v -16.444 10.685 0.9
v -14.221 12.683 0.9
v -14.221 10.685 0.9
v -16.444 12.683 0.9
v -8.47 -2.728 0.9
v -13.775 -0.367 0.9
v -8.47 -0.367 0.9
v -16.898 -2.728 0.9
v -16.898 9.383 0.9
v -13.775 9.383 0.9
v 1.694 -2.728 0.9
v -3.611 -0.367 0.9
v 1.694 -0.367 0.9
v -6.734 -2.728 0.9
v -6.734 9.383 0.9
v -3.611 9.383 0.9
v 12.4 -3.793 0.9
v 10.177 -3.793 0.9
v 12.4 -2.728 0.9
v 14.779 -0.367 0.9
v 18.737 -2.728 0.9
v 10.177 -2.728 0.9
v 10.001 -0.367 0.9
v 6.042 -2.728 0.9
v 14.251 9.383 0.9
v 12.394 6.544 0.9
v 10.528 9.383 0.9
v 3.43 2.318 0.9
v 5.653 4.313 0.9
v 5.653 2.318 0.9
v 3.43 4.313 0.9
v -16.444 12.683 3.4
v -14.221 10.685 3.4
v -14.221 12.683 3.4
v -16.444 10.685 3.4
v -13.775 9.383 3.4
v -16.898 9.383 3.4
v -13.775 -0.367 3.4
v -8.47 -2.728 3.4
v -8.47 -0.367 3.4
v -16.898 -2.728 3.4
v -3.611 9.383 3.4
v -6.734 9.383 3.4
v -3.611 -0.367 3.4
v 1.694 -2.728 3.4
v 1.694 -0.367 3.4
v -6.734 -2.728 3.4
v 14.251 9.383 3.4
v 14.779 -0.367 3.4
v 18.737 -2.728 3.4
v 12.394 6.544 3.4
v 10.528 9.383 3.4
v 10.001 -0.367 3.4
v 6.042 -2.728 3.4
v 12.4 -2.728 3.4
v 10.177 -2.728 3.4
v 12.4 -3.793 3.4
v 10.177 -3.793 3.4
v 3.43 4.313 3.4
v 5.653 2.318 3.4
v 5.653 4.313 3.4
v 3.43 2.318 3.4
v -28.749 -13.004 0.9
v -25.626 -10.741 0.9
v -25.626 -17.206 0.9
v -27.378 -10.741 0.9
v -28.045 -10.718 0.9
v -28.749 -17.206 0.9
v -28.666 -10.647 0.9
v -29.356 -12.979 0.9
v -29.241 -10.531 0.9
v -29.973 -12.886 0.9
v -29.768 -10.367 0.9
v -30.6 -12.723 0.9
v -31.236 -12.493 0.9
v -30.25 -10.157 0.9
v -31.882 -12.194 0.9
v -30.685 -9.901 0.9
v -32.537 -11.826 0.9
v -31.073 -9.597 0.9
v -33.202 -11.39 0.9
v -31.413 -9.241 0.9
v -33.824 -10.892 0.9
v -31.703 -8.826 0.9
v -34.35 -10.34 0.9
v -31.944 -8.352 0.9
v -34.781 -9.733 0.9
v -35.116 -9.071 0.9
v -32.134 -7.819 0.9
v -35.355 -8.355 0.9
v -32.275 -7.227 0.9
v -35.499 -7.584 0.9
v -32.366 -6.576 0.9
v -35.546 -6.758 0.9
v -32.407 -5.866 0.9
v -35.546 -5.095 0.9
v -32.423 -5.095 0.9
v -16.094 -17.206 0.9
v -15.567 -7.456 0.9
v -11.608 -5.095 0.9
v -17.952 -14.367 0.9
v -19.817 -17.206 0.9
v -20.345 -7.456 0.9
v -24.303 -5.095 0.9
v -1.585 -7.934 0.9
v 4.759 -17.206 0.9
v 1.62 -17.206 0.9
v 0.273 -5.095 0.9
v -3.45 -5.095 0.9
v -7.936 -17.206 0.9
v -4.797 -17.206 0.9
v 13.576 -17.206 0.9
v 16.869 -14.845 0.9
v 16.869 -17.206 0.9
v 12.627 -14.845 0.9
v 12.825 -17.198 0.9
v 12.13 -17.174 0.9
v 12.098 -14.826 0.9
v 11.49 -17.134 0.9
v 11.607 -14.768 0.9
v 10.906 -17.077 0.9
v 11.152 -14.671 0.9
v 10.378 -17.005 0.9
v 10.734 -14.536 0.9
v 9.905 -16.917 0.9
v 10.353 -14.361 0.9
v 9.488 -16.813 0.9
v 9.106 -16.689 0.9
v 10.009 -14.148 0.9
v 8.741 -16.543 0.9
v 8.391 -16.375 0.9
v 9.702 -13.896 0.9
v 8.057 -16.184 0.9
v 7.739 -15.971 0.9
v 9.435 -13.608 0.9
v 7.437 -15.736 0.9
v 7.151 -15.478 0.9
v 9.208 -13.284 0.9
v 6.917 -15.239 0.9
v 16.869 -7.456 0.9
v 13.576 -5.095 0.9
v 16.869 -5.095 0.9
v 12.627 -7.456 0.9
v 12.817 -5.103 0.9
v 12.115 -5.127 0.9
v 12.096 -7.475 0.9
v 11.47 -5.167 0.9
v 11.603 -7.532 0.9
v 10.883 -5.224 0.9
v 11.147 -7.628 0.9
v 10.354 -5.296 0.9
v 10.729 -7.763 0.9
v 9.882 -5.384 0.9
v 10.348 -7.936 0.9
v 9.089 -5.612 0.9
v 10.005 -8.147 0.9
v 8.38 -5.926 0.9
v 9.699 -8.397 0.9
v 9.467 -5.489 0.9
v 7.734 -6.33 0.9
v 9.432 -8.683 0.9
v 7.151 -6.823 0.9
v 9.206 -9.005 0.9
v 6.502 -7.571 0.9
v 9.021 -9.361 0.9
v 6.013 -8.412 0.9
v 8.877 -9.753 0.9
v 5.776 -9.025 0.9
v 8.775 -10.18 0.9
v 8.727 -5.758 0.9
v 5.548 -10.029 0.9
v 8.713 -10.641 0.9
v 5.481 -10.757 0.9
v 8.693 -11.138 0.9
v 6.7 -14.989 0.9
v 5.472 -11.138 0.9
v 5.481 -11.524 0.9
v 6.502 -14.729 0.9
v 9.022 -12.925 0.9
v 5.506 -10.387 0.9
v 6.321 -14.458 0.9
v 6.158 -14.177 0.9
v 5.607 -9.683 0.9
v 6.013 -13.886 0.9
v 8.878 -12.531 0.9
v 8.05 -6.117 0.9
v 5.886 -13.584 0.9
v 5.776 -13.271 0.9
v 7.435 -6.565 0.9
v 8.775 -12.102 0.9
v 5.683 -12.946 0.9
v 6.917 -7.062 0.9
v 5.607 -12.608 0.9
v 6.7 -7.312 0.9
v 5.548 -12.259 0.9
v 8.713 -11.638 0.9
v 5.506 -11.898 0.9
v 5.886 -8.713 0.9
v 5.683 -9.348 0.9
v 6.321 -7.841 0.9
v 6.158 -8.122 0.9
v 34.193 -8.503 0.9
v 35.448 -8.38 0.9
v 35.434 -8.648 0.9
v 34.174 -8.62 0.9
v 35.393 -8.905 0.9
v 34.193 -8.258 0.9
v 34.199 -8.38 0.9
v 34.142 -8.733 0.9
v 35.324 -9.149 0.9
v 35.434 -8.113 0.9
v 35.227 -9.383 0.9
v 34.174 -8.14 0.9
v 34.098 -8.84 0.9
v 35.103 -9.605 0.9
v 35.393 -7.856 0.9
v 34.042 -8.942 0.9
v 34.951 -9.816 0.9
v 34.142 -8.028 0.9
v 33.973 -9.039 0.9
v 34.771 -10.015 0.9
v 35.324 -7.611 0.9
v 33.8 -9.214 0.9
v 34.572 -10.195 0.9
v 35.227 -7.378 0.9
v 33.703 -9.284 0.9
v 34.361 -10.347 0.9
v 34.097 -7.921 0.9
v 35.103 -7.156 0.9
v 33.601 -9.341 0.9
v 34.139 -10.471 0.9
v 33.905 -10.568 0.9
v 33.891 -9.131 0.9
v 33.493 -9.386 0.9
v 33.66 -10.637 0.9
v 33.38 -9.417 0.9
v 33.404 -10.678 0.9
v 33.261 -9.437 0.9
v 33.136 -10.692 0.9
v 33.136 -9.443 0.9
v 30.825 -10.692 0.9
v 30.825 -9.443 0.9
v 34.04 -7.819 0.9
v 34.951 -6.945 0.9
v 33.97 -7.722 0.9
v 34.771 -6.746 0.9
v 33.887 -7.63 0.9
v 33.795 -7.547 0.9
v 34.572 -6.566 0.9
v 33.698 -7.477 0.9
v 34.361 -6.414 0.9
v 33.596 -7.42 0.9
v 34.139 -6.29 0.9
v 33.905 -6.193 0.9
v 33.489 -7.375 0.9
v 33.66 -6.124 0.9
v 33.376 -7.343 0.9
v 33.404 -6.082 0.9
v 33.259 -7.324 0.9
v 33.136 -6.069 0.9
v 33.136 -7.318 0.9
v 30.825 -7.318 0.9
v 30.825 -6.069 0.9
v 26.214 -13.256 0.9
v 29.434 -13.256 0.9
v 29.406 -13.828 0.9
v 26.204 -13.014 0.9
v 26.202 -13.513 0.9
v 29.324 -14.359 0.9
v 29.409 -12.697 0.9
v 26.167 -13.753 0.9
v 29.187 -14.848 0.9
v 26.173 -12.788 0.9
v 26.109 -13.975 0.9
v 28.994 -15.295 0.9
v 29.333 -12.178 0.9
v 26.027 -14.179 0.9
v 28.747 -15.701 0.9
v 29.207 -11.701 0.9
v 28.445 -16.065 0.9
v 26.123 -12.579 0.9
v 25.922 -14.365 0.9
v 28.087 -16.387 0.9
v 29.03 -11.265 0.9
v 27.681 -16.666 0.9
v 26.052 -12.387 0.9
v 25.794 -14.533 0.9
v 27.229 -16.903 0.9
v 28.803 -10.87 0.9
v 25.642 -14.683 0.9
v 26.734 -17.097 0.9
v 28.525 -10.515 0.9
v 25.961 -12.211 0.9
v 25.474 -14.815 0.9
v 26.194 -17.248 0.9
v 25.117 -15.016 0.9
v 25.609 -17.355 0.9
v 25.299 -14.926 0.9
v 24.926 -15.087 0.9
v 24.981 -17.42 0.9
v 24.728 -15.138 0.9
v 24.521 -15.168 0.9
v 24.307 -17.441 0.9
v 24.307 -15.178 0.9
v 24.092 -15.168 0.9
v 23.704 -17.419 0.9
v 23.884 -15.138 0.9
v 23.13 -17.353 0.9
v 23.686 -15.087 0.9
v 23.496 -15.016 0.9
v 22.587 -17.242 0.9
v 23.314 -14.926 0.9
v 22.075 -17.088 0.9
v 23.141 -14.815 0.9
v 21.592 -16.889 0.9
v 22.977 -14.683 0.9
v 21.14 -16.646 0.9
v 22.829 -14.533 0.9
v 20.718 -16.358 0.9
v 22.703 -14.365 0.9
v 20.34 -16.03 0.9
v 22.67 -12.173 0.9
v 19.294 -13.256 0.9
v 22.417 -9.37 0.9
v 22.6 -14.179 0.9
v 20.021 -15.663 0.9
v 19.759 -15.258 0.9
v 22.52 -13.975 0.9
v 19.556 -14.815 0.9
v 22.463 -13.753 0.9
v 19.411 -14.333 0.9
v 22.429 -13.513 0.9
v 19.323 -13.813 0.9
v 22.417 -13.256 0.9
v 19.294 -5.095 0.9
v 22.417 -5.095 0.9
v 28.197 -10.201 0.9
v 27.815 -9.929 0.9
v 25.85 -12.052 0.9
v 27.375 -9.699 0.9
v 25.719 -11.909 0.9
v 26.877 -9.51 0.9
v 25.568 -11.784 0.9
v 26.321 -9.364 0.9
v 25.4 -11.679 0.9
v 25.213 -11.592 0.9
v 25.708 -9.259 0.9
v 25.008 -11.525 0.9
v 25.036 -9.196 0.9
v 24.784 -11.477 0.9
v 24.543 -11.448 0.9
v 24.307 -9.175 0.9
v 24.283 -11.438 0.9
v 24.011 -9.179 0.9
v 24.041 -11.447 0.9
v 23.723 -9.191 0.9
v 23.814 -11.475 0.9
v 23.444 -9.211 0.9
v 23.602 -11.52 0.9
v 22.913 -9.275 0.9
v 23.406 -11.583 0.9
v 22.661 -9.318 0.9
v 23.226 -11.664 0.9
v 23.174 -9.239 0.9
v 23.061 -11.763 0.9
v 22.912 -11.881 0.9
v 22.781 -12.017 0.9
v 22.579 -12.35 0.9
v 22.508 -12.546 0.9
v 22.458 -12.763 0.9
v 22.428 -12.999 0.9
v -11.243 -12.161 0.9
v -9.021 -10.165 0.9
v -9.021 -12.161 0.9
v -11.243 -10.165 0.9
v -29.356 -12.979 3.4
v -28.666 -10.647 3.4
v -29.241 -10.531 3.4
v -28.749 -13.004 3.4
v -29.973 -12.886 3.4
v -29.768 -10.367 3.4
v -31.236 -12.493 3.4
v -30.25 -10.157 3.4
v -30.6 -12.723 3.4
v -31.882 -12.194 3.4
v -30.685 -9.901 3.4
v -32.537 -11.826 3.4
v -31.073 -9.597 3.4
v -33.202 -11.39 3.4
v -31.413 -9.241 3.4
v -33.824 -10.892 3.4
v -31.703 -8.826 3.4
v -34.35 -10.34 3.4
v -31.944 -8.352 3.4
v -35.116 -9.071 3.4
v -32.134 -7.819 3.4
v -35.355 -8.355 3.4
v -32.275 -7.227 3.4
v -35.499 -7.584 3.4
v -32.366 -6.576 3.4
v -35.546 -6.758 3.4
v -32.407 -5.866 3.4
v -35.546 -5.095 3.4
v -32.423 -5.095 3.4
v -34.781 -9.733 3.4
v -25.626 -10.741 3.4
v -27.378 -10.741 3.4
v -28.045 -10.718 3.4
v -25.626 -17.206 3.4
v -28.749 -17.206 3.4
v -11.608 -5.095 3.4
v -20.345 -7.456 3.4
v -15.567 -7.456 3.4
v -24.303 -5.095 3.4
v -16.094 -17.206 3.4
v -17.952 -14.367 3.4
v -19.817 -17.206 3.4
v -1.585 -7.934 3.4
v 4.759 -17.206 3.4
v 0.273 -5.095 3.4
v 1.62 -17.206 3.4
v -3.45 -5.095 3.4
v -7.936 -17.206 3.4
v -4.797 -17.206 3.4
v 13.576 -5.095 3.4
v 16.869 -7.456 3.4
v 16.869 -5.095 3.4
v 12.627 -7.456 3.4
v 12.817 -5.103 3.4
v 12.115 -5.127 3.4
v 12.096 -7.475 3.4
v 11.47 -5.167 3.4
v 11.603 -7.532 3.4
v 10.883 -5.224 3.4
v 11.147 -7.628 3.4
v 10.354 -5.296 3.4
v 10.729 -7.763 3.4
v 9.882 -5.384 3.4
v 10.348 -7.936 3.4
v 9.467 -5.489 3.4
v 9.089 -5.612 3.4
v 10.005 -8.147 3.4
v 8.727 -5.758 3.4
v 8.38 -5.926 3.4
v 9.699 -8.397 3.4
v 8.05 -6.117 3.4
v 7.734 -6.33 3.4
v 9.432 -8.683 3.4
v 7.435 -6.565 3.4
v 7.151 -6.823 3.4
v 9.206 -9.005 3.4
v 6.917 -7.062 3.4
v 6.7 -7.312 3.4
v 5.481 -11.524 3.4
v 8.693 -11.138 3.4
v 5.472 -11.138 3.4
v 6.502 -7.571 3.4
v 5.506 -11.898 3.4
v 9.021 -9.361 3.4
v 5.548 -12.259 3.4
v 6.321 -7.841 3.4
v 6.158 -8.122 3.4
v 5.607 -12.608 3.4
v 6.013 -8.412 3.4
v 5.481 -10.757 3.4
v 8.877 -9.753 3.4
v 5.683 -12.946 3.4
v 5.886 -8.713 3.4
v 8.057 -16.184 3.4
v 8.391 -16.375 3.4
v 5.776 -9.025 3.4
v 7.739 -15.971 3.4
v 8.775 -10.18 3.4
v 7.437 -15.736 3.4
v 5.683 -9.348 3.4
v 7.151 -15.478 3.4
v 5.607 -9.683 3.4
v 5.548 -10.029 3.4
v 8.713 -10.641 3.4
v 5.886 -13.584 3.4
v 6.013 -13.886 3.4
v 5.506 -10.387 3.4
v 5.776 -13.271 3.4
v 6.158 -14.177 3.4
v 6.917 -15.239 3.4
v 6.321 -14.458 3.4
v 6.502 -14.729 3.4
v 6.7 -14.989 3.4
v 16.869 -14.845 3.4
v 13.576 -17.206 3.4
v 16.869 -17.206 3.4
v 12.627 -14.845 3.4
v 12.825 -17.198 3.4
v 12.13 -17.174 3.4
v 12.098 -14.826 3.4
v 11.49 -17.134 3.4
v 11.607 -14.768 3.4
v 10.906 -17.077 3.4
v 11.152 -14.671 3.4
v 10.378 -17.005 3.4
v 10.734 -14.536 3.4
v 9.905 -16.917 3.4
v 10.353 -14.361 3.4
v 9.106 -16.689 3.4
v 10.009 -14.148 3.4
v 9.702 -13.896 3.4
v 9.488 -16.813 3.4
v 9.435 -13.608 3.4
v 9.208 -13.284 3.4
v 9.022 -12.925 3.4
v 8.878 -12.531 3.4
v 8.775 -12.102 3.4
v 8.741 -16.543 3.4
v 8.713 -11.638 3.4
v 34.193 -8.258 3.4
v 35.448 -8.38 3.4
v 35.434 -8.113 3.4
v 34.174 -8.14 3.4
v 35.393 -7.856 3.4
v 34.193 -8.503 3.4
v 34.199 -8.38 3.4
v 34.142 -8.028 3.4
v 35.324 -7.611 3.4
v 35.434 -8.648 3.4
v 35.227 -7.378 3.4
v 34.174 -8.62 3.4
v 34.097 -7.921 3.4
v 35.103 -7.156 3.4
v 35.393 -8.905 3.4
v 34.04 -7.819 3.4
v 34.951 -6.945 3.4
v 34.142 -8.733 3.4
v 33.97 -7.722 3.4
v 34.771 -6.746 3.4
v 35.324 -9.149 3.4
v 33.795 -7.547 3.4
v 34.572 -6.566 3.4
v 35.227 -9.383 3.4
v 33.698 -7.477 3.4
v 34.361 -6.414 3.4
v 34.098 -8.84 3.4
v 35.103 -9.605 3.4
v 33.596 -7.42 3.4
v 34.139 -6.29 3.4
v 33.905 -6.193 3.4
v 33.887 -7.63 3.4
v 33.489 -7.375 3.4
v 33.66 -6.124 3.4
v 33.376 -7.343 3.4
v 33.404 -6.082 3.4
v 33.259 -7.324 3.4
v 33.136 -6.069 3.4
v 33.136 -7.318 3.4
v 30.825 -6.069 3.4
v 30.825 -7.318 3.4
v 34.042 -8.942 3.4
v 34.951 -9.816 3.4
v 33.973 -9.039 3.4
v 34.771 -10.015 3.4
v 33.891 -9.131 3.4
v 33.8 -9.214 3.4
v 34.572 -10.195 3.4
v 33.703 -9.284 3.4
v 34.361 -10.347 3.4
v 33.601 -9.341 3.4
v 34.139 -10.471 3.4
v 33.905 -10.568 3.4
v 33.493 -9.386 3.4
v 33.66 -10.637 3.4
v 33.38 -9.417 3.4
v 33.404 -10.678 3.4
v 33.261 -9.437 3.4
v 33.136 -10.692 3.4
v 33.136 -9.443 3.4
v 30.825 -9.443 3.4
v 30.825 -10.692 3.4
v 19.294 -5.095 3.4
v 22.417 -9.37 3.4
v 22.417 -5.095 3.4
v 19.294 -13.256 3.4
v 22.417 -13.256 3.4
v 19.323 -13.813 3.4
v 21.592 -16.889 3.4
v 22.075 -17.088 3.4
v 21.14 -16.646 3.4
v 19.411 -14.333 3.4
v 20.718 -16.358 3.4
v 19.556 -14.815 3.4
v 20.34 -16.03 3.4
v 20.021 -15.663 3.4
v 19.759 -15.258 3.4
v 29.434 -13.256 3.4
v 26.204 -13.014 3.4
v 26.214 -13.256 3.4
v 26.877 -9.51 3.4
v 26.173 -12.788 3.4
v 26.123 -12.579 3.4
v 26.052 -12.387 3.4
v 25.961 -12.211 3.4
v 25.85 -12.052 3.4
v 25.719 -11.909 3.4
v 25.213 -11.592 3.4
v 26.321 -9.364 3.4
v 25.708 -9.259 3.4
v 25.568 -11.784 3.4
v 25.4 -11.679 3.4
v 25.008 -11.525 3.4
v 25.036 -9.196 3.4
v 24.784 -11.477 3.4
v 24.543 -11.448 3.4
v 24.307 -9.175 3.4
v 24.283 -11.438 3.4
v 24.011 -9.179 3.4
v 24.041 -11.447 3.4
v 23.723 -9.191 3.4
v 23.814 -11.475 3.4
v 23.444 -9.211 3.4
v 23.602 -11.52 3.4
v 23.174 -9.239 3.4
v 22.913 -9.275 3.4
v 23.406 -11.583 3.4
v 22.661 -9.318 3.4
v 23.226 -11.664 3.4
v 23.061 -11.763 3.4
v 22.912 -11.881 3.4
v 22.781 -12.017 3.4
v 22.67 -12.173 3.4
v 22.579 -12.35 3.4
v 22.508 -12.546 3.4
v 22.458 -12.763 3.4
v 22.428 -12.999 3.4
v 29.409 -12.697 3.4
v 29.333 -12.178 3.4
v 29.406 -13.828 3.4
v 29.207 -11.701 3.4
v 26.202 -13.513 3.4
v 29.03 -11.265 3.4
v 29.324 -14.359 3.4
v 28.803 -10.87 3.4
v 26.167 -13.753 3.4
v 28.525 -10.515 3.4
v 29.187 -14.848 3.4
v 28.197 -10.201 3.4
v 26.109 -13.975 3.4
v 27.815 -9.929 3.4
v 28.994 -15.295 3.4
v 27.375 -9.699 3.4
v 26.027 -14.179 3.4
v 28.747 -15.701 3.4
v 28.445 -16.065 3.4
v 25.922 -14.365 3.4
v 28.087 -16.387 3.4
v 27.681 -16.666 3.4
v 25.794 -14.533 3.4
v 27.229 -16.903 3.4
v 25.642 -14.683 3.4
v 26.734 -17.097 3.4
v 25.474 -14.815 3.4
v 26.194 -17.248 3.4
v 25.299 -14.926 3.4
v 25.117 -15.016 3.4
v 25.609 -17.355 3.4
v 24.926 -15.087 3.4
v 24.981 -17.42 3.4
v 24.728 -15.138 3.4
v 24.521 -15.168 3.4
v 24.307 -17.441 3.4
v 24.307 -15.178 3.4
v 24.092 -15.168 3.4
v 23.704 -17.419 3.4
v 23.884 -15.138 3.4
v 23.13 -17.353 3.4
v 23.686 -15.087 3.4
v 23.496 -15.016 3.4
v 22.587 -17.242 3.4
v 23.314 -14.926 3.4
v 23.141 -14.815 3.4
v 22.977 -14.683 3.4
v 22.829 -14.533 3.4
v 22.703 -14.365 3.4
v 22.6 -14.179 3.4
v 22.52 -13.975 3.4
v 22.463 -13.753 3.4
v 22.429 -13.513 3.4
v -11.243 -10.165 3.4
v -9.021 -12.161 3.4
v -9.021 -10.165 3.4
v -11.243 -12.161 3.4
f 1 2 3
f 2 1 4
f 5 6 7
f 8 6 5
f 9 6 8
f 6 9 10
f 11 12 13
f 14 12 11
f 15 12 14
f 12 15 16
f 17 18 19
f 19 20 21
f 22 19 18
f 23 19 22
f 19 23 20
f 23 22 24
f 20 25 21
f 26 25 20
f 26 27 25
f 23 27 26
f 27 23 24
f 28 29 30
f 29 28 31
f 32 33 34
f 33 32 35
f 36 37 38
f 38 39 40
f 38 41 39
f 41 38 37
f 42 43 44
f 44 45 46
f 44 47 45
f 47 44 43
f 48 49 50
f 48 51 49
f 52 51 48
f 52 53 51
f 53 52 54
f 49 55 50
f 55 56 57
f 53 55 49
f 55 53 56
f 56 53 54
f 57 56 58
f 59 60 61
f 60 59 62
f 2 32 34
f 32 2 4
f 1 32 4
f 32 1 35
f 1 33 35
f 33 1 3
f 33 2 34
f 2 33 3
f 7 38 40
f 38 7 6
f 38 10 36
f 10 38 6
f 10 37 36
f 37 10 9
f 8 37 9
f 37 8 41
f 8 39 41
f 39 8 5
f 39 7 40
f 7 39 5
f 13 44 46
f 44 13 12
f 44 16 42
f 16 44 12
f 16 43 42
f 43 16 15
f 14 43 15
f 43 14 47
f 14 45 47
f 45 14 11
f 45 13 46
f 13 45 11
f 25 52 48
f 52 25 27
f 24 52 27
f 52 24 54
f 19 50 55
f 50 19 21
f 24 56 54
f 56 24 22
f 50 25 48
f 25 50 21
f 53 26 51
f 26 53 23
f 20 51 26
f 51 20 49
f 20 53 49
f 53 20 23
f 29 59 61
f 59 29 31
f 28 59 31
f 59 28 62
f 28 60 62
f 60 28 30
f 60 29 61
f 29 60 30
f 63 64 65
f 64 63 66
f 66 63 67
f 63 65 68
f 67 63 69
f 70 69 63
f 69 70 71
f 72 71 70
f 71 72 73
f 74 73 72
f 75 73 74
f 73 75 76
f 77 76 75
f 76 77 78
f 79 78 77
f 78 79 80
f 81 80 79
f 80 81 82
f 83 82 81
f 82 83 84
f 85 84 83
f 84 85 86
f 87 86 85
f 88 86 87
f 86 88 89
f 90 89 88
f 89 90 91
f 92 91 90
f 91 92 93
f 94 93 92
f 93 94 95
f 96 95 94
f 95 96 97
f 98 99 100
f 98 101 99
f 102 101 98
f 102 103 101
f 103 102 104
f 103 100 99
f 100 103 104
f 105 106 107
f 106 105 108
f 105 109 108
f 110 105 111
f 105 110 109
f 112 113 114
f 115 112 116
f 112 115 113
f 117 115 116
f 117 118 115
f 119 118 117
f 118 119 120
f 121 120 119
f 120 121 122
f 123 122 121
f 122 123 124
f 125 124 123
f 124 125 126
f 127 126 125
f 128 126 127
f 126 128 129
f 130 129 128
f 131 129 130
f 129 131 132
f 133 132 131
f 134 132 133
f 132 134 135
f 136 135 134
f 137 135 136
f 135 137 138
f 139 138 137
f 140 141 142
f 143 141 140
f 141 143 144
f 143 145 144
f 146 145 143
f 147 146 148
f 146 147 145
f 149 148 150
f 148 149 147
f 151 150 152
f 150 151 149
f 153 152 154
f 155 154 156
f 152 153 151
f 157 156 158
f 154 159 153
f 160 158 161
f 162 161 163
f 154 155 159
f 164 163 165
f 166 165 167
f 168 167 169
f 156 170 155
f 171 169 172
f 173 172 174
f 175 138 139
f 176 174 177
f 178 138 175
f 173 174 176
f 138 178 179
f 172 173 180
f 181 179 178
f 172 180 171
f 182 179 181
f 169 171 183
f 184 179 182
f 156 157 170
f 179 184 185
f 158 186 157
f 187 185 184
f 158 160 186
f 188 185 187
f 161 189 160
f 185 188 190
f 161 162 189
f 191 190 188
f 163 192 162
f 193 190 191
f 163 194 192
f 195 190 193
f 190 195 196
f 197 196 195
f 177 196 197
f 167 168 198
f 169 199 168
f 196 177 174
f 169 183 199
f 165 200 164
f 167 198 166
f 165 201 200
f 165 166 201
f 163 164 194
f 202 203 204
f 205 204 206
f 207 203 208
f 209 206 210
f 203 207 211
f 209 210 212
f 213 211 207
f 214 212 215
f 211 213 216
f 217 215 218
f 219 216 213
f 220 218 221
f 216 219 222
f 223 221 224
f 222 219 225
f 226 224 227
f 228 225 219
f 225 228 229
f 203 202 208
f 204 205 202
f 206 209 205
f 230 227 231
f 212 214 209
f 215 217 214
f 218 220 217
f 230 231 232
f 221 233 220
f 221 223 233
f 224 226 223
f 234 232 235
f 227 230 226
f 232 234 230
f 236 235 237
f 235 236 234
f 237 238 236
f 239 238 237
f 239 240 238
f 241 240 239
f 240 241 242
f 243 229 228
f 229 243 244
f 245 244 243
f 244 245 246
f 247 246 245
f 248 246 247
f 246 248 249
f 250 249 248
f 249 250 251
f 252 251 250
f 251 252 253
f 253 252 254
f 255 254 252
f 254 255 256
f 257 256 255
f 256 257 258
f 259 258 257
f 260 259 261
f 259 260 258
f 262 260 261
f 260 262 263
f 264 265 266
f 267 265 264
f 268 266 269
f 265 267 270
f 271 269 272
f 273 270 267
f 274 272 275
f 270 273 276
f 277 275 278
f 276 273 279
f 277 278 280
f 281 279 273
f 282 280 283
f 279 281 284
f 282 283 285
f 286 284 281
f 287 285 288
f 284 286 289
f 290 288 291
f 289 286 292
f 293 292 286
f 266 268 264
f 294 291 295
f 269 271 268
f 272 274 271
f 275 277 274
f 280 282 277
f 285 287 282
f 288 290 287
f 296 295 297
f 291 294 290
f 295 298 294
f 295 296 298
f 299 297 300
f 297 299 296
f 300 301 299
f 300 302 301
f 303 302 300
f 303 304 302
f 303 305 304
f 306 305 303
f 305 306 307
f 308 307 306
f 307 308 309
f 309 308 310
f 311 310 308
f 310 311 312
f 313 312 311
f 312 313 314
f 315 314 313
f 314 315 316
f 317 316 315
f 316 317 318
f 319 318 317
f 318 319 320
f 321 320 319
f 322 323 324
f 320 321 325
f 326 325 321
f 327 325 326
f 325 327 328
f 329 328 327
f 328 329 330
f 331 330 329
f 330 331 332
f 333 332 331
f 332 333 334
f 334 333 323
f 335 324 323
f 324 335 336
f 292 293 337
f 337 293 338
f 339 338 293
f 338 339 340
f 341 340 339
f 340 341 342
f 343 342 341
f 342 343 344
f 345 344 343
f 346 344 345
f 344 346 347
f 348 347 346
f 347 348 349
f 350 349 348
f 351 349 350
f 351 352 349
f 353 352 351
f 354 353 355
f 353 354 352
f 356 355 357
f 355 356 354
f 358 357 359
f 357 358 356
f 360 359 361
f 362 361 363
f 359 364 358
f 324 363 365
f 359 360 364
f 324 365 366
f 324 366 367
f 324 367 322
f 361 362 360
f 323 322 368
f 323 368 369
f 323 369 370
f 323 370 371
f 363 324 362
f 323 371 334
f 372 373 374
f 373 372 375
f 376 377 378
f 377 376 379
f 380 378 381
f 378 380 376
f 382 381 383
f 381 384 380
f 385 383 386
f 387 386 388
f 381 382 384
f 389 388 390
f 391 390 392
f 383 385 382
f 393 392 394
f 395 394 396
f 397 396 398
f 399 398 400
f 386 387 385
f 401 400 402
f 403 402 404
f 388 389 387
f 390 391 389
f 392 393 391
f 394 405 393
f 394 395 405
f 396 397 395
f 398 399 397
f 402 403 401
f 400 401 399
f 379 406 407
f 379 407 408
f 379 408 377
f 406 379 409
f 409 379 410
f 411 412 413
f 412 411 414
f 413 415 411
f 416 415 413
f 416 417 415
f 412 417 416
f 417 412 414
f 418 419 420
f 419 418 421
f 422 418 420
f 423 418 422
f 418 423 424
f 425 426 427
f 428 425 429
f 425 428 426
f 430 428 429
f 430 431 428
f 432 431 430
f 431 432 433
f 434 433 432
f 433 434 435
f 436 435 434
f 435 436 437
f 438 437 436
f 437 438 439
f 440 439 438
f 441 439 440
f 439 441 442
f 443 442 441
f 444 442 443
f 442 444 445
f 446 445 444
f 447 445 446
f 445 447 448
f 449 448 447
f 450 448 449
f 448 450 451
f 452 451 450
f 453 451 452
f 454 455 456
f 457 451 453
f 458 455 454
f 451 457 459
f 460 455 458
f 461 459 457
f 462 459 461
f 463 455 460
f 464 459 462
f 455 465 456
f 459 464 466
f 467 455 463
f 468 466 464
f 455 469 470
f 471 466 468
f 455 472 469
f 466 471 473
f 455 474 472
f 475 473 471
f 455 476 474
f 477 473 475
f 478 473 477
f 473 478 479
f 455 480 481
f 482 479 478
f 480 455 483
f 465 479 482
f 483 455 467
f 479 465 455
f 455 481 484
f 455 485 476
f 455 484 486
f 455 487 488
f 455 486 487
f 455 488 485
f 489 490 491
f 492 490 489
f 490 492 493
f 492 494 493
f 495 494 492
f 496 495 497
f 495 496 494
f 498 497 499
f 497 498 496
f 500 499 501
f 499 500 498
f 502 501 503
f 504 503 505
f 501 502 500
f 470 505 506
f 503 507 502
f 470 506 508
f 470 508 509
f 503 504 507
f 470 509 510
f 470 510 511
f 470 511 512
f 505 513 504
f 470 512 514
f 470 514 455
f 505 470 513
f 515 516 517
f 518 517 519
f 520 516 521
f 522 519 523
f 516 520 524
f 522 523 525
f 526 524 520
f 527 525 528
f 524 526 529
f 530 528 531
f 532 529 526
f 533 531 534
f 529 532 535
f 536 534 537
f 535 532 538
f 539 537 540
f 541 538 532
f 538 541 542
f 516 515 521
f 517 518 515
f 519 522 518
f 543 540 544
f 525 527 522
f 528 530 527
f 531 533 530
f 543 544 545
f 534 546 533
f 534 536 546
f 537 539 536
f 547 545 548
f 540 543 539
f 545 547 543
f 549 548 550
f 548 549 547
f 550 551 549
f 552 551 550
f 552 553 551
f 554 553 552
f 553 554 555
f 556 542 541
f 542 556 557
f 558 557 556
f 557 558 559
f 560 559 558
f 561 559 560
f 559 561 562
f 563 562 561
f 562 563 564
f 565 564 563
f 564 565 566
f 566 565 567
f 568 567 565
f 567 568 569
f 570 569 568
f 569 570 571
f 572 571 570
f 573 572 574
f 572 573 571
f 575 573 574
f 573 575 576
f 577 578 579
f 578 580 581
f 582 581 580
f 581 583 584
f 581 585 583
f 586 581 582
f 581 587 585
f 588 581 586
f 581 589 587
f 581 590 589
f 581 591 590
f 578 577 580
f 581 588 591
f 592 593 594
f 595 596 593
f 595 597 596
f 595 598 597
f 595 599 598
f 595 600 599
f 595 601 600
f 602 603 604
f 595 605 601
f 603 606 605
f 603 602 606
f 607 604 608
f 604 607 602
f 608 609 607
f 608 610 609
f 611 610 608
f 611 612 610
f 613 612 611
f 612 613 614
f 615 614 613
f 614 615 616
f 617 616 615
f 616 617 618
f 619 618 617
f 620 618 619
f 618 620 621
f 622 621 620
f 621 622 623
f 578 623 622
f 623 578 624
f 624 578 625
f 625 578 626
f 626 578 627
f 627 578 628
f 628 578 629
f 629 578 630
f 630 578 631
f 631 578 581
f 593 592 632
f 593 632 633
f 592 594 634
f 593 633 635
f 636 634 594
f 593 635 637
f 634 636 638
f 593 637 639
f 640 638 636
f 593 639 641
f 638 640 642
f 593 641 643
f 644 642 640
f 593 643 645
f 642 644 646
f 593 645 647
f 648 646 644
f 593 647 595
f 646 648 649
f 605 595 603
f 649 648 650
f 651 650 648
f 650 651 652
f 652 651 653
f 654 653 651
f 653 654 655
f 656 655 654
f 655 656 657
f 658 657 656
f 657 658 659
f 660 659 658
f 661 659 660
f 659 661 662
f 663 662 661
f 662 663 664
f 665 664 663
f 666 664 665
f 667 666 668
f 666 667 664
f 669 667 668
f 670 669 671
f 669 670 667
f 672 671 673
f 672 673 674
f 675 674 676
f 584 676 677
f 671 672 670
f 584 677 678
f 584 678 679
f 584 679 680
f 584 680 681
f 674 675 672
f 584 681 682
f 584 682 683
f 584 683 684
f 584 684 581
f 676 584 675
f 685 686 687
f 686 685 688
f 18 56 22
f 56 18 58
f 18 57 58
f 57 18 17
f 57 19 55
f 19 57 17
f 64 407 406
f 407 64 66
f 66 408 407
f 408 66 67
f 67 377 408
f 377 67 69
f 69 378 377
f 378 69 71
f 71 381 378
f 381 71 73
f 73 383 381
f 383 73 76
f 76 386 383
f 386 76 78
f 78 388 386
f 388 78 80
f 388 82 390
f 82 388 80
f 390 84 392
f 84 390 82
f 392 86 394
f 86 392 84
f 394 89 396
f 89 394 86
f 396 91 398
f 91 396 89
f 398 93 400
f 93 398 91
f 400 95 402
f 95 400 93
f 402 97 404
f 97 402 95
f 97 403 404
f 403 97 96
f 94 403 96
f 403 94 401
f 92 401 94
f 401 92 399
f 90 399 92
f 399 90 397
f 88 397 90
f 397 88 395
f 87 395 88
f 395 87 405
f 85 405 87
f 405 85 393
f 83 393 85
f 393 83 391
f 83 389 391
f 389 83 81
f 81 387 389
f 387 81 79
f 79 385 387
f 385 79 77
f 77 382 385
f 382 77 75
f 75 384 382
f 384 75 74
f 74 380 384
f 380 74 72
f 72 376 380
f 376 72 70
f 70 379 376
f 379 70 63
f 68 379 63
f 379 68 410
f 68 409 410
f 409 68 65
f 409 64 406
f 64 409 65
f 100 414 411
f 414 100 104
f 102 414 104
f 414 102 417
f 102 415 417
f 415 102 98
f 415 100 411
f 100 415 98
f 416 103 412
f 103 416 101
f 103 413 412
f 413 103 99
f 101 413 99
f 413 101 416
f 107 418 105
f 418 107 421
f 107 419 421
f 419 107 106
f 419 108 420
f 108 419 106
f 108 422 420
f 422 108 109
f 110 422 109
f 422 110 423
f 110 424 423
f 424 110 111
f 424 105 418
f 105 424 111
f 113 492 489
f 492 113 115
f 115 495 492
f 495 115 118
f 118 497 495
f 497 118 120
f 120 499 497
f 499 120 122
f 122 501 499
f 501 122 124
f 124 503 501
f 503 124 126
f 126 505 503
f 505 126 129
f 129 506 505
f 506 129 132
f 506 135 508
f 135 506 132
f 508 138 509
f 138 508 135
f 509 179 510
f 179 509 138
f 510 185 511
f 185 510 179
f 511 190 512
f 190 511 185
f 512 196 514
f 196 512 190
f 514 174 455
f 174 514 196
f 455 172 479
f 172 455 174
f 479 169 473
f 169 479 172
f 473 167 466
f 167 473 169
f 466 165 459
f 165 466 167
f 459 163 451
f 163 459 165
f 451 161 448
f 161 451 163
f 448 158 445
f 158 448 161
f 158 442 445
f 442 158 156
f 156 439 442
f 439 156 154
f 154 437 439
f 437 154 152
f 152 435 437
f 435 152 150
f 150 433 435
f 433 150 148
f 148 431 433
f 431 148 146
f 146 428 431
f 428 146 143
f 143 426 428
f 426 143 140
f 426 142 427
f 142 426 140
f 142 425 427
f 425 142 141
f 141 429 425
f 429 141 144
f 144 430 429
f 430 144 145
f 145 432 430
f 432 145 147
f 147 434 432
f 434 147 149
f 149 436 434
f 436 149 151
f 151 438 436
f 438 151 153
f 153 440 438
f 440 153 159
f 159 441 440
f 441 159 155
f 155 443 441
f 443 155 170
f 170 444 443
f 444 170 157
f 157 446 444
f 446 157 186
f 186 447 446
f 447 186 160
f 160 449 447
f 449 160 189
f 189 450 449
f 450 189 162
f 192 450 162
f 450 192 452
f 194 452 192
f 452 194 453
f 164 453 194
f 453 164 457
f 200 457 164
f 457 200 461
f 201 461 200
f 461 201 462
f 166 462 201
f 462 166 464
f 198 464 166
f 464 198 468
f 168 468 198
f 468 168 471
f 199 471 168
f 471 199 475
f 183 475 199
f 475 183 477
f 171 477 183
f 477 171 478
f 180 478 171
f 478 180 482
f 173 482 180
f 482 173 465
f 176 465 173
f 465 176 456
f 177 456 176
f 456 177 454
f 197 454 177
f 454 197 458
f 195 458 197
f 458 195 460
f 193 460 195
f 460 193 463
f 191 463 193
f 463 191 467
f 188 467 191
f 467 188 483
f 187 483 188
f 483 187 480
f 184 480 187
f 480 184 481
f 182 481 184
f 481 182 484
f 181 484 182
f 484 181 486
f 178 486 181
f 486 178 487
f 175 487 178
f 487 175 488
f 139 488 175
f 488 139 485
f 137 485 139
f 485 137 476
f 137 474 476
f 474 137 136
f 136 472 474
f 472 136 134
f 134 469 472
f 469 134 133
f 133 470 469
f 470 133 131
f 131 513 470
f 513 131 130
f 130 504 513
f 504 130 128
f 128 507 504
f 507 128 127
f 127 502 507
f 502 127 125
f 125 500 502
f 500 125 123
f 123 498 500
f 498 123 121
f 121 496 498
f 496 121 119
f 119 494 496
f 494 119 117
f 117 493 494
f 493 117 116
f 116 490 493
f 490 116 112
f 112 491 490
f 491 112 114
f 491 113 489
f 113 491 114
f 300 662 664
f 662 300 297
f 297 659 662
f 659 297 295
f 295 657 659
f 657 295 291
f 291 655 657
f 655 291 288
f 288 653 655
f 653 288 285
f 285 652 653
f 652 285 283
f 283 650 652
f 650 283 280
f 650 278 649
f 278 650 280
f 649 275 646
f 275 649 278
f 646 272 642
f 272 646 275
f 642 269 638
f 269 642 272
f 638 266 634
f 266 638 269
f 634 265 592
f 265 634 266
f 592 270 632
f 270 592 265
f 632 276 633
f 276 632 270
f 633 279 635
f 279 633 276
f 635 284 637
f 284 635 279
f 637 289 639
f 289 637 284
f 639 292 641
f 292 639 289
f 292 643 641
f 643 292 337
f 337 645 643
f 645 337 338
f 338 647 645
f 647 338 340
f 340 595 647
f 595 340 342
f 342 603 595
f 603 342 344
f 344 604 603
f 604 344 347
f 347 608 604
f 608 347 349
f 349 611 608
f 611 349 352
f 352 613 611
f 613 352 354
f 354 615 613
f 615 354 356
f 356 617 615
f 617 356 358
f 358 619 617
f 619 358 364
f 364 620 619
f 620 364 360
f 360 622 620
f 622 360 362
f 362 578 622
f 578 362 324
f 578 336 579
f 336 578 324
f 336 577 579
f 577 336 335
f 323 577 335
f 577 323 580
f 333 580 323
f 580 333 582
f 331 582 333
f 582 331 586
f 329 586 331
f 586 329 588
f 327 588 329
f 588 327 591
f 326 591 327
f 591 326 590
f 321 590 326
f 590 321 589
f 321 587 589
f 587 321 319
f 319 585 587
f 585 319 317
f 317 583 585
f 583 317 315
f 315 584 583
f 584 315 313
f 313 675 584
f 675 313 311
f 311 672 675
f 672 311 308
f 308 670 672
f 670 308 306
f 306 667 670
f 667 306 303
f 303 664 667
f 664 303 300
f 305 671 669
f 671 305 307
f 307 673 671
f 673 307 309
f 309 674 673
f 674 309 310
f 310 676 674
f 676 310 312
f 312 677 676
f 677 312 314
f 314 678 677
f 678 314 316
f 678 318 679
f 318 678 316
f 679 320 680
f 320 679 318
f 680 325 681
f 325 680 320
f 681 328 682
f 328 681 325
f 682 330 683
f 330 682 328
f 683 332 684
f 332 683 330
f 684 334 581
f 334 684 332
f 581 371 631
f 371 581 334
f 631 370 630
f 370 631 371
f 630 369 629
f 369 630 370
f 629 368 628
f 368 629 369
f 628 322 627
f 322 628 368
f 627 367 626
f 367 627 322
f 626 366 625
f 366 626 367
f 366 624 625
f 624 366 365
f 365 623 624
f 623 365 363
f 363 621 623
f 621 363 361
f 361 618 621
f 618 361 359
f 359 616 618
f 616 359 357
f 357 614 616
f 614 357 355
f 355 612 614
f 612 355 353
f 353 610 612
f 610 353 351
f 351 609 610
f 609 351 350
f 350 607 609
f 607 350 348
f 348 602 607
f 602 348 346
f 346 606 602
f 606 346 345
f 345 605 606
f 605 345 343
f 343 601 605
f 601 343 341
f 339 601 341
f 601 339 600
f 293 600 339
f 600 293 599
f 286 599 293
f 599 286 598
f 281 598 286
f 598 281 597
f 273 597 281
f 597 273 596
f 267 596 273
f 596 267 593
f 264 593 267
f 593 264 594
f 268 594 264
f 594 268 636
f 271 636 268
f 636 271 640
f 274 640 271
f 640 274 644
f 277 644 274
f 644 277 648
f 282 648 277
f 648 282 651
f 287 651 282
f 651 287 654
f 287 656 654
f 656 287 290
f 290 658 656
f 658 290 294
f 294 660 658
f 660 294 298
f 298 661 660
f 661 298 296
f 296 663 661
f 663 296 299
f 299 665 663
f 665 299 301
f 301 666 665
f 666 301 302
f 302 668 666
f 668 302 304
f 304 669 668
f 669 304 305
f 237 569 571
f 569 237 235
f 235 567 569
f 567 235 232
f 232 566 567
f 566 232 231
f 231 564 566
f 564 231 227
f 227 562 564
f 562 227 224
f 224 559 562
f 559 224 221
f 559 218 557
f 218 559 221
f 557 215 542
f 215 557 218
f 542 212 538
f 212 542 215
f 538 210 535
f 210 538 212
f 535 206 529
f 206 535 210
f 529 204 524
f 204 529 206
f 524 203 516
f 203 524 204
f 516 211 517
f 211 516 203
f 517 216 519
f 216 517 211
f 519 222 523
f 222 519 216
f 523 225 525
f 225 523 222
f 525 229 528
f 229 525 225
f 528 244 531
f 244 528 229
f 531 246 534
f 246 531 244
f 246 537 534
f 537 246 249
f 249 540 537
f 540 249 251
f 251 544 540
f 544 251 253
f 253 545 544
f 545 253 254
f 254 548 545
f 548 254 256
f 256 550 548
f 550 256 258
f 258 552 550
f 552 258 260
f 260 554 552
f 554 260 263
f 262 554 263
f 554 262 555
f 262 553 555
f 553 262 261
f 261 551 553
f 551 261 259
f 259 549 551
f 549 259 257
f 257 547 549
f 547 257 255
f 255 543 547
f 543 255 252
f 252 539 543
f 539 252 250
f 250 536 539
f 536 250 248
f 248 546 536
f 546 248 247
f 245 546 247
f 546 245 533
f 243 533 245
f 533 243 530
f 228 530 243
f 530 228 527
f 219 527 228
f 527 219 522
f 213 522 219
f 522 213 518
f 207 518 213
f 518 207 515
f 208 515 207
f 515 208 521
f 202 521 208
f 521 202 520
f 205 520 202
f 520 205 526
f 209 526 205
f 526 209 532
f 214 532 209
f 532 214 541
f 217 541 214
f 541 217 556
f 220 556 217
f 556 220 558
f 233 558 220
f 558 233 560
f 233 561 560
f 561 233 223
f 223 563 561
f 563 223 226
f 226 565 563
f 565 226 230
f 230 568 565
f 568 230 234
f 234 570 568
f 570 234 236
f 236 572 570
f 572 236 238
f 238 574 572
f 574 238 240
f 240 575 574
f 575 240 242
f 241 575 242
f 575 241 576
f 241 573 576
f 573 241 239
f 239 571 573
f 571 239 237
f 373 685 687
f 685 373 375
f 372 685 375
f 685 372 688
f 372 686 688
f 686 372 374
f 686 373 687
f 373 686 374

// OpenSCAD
$fn = 48;
  // syllabics (overlaid on icon, tallest)
  translate([0, 4.797, 0.900]) linear_extrude(height=2.500) text("ᒫᒪᐎ", size=11.962, halign="center", valign="center", font="Euphemia UCAS:style=Bold");
  translate([0, -9.797, 0.900]) linear_extrude(height=2.500) text("ᓭᐍᐱᑖᑲᐣ", size=11.962, halign="center", valign="center", font="Euphemia UCAS:style=Bold");
